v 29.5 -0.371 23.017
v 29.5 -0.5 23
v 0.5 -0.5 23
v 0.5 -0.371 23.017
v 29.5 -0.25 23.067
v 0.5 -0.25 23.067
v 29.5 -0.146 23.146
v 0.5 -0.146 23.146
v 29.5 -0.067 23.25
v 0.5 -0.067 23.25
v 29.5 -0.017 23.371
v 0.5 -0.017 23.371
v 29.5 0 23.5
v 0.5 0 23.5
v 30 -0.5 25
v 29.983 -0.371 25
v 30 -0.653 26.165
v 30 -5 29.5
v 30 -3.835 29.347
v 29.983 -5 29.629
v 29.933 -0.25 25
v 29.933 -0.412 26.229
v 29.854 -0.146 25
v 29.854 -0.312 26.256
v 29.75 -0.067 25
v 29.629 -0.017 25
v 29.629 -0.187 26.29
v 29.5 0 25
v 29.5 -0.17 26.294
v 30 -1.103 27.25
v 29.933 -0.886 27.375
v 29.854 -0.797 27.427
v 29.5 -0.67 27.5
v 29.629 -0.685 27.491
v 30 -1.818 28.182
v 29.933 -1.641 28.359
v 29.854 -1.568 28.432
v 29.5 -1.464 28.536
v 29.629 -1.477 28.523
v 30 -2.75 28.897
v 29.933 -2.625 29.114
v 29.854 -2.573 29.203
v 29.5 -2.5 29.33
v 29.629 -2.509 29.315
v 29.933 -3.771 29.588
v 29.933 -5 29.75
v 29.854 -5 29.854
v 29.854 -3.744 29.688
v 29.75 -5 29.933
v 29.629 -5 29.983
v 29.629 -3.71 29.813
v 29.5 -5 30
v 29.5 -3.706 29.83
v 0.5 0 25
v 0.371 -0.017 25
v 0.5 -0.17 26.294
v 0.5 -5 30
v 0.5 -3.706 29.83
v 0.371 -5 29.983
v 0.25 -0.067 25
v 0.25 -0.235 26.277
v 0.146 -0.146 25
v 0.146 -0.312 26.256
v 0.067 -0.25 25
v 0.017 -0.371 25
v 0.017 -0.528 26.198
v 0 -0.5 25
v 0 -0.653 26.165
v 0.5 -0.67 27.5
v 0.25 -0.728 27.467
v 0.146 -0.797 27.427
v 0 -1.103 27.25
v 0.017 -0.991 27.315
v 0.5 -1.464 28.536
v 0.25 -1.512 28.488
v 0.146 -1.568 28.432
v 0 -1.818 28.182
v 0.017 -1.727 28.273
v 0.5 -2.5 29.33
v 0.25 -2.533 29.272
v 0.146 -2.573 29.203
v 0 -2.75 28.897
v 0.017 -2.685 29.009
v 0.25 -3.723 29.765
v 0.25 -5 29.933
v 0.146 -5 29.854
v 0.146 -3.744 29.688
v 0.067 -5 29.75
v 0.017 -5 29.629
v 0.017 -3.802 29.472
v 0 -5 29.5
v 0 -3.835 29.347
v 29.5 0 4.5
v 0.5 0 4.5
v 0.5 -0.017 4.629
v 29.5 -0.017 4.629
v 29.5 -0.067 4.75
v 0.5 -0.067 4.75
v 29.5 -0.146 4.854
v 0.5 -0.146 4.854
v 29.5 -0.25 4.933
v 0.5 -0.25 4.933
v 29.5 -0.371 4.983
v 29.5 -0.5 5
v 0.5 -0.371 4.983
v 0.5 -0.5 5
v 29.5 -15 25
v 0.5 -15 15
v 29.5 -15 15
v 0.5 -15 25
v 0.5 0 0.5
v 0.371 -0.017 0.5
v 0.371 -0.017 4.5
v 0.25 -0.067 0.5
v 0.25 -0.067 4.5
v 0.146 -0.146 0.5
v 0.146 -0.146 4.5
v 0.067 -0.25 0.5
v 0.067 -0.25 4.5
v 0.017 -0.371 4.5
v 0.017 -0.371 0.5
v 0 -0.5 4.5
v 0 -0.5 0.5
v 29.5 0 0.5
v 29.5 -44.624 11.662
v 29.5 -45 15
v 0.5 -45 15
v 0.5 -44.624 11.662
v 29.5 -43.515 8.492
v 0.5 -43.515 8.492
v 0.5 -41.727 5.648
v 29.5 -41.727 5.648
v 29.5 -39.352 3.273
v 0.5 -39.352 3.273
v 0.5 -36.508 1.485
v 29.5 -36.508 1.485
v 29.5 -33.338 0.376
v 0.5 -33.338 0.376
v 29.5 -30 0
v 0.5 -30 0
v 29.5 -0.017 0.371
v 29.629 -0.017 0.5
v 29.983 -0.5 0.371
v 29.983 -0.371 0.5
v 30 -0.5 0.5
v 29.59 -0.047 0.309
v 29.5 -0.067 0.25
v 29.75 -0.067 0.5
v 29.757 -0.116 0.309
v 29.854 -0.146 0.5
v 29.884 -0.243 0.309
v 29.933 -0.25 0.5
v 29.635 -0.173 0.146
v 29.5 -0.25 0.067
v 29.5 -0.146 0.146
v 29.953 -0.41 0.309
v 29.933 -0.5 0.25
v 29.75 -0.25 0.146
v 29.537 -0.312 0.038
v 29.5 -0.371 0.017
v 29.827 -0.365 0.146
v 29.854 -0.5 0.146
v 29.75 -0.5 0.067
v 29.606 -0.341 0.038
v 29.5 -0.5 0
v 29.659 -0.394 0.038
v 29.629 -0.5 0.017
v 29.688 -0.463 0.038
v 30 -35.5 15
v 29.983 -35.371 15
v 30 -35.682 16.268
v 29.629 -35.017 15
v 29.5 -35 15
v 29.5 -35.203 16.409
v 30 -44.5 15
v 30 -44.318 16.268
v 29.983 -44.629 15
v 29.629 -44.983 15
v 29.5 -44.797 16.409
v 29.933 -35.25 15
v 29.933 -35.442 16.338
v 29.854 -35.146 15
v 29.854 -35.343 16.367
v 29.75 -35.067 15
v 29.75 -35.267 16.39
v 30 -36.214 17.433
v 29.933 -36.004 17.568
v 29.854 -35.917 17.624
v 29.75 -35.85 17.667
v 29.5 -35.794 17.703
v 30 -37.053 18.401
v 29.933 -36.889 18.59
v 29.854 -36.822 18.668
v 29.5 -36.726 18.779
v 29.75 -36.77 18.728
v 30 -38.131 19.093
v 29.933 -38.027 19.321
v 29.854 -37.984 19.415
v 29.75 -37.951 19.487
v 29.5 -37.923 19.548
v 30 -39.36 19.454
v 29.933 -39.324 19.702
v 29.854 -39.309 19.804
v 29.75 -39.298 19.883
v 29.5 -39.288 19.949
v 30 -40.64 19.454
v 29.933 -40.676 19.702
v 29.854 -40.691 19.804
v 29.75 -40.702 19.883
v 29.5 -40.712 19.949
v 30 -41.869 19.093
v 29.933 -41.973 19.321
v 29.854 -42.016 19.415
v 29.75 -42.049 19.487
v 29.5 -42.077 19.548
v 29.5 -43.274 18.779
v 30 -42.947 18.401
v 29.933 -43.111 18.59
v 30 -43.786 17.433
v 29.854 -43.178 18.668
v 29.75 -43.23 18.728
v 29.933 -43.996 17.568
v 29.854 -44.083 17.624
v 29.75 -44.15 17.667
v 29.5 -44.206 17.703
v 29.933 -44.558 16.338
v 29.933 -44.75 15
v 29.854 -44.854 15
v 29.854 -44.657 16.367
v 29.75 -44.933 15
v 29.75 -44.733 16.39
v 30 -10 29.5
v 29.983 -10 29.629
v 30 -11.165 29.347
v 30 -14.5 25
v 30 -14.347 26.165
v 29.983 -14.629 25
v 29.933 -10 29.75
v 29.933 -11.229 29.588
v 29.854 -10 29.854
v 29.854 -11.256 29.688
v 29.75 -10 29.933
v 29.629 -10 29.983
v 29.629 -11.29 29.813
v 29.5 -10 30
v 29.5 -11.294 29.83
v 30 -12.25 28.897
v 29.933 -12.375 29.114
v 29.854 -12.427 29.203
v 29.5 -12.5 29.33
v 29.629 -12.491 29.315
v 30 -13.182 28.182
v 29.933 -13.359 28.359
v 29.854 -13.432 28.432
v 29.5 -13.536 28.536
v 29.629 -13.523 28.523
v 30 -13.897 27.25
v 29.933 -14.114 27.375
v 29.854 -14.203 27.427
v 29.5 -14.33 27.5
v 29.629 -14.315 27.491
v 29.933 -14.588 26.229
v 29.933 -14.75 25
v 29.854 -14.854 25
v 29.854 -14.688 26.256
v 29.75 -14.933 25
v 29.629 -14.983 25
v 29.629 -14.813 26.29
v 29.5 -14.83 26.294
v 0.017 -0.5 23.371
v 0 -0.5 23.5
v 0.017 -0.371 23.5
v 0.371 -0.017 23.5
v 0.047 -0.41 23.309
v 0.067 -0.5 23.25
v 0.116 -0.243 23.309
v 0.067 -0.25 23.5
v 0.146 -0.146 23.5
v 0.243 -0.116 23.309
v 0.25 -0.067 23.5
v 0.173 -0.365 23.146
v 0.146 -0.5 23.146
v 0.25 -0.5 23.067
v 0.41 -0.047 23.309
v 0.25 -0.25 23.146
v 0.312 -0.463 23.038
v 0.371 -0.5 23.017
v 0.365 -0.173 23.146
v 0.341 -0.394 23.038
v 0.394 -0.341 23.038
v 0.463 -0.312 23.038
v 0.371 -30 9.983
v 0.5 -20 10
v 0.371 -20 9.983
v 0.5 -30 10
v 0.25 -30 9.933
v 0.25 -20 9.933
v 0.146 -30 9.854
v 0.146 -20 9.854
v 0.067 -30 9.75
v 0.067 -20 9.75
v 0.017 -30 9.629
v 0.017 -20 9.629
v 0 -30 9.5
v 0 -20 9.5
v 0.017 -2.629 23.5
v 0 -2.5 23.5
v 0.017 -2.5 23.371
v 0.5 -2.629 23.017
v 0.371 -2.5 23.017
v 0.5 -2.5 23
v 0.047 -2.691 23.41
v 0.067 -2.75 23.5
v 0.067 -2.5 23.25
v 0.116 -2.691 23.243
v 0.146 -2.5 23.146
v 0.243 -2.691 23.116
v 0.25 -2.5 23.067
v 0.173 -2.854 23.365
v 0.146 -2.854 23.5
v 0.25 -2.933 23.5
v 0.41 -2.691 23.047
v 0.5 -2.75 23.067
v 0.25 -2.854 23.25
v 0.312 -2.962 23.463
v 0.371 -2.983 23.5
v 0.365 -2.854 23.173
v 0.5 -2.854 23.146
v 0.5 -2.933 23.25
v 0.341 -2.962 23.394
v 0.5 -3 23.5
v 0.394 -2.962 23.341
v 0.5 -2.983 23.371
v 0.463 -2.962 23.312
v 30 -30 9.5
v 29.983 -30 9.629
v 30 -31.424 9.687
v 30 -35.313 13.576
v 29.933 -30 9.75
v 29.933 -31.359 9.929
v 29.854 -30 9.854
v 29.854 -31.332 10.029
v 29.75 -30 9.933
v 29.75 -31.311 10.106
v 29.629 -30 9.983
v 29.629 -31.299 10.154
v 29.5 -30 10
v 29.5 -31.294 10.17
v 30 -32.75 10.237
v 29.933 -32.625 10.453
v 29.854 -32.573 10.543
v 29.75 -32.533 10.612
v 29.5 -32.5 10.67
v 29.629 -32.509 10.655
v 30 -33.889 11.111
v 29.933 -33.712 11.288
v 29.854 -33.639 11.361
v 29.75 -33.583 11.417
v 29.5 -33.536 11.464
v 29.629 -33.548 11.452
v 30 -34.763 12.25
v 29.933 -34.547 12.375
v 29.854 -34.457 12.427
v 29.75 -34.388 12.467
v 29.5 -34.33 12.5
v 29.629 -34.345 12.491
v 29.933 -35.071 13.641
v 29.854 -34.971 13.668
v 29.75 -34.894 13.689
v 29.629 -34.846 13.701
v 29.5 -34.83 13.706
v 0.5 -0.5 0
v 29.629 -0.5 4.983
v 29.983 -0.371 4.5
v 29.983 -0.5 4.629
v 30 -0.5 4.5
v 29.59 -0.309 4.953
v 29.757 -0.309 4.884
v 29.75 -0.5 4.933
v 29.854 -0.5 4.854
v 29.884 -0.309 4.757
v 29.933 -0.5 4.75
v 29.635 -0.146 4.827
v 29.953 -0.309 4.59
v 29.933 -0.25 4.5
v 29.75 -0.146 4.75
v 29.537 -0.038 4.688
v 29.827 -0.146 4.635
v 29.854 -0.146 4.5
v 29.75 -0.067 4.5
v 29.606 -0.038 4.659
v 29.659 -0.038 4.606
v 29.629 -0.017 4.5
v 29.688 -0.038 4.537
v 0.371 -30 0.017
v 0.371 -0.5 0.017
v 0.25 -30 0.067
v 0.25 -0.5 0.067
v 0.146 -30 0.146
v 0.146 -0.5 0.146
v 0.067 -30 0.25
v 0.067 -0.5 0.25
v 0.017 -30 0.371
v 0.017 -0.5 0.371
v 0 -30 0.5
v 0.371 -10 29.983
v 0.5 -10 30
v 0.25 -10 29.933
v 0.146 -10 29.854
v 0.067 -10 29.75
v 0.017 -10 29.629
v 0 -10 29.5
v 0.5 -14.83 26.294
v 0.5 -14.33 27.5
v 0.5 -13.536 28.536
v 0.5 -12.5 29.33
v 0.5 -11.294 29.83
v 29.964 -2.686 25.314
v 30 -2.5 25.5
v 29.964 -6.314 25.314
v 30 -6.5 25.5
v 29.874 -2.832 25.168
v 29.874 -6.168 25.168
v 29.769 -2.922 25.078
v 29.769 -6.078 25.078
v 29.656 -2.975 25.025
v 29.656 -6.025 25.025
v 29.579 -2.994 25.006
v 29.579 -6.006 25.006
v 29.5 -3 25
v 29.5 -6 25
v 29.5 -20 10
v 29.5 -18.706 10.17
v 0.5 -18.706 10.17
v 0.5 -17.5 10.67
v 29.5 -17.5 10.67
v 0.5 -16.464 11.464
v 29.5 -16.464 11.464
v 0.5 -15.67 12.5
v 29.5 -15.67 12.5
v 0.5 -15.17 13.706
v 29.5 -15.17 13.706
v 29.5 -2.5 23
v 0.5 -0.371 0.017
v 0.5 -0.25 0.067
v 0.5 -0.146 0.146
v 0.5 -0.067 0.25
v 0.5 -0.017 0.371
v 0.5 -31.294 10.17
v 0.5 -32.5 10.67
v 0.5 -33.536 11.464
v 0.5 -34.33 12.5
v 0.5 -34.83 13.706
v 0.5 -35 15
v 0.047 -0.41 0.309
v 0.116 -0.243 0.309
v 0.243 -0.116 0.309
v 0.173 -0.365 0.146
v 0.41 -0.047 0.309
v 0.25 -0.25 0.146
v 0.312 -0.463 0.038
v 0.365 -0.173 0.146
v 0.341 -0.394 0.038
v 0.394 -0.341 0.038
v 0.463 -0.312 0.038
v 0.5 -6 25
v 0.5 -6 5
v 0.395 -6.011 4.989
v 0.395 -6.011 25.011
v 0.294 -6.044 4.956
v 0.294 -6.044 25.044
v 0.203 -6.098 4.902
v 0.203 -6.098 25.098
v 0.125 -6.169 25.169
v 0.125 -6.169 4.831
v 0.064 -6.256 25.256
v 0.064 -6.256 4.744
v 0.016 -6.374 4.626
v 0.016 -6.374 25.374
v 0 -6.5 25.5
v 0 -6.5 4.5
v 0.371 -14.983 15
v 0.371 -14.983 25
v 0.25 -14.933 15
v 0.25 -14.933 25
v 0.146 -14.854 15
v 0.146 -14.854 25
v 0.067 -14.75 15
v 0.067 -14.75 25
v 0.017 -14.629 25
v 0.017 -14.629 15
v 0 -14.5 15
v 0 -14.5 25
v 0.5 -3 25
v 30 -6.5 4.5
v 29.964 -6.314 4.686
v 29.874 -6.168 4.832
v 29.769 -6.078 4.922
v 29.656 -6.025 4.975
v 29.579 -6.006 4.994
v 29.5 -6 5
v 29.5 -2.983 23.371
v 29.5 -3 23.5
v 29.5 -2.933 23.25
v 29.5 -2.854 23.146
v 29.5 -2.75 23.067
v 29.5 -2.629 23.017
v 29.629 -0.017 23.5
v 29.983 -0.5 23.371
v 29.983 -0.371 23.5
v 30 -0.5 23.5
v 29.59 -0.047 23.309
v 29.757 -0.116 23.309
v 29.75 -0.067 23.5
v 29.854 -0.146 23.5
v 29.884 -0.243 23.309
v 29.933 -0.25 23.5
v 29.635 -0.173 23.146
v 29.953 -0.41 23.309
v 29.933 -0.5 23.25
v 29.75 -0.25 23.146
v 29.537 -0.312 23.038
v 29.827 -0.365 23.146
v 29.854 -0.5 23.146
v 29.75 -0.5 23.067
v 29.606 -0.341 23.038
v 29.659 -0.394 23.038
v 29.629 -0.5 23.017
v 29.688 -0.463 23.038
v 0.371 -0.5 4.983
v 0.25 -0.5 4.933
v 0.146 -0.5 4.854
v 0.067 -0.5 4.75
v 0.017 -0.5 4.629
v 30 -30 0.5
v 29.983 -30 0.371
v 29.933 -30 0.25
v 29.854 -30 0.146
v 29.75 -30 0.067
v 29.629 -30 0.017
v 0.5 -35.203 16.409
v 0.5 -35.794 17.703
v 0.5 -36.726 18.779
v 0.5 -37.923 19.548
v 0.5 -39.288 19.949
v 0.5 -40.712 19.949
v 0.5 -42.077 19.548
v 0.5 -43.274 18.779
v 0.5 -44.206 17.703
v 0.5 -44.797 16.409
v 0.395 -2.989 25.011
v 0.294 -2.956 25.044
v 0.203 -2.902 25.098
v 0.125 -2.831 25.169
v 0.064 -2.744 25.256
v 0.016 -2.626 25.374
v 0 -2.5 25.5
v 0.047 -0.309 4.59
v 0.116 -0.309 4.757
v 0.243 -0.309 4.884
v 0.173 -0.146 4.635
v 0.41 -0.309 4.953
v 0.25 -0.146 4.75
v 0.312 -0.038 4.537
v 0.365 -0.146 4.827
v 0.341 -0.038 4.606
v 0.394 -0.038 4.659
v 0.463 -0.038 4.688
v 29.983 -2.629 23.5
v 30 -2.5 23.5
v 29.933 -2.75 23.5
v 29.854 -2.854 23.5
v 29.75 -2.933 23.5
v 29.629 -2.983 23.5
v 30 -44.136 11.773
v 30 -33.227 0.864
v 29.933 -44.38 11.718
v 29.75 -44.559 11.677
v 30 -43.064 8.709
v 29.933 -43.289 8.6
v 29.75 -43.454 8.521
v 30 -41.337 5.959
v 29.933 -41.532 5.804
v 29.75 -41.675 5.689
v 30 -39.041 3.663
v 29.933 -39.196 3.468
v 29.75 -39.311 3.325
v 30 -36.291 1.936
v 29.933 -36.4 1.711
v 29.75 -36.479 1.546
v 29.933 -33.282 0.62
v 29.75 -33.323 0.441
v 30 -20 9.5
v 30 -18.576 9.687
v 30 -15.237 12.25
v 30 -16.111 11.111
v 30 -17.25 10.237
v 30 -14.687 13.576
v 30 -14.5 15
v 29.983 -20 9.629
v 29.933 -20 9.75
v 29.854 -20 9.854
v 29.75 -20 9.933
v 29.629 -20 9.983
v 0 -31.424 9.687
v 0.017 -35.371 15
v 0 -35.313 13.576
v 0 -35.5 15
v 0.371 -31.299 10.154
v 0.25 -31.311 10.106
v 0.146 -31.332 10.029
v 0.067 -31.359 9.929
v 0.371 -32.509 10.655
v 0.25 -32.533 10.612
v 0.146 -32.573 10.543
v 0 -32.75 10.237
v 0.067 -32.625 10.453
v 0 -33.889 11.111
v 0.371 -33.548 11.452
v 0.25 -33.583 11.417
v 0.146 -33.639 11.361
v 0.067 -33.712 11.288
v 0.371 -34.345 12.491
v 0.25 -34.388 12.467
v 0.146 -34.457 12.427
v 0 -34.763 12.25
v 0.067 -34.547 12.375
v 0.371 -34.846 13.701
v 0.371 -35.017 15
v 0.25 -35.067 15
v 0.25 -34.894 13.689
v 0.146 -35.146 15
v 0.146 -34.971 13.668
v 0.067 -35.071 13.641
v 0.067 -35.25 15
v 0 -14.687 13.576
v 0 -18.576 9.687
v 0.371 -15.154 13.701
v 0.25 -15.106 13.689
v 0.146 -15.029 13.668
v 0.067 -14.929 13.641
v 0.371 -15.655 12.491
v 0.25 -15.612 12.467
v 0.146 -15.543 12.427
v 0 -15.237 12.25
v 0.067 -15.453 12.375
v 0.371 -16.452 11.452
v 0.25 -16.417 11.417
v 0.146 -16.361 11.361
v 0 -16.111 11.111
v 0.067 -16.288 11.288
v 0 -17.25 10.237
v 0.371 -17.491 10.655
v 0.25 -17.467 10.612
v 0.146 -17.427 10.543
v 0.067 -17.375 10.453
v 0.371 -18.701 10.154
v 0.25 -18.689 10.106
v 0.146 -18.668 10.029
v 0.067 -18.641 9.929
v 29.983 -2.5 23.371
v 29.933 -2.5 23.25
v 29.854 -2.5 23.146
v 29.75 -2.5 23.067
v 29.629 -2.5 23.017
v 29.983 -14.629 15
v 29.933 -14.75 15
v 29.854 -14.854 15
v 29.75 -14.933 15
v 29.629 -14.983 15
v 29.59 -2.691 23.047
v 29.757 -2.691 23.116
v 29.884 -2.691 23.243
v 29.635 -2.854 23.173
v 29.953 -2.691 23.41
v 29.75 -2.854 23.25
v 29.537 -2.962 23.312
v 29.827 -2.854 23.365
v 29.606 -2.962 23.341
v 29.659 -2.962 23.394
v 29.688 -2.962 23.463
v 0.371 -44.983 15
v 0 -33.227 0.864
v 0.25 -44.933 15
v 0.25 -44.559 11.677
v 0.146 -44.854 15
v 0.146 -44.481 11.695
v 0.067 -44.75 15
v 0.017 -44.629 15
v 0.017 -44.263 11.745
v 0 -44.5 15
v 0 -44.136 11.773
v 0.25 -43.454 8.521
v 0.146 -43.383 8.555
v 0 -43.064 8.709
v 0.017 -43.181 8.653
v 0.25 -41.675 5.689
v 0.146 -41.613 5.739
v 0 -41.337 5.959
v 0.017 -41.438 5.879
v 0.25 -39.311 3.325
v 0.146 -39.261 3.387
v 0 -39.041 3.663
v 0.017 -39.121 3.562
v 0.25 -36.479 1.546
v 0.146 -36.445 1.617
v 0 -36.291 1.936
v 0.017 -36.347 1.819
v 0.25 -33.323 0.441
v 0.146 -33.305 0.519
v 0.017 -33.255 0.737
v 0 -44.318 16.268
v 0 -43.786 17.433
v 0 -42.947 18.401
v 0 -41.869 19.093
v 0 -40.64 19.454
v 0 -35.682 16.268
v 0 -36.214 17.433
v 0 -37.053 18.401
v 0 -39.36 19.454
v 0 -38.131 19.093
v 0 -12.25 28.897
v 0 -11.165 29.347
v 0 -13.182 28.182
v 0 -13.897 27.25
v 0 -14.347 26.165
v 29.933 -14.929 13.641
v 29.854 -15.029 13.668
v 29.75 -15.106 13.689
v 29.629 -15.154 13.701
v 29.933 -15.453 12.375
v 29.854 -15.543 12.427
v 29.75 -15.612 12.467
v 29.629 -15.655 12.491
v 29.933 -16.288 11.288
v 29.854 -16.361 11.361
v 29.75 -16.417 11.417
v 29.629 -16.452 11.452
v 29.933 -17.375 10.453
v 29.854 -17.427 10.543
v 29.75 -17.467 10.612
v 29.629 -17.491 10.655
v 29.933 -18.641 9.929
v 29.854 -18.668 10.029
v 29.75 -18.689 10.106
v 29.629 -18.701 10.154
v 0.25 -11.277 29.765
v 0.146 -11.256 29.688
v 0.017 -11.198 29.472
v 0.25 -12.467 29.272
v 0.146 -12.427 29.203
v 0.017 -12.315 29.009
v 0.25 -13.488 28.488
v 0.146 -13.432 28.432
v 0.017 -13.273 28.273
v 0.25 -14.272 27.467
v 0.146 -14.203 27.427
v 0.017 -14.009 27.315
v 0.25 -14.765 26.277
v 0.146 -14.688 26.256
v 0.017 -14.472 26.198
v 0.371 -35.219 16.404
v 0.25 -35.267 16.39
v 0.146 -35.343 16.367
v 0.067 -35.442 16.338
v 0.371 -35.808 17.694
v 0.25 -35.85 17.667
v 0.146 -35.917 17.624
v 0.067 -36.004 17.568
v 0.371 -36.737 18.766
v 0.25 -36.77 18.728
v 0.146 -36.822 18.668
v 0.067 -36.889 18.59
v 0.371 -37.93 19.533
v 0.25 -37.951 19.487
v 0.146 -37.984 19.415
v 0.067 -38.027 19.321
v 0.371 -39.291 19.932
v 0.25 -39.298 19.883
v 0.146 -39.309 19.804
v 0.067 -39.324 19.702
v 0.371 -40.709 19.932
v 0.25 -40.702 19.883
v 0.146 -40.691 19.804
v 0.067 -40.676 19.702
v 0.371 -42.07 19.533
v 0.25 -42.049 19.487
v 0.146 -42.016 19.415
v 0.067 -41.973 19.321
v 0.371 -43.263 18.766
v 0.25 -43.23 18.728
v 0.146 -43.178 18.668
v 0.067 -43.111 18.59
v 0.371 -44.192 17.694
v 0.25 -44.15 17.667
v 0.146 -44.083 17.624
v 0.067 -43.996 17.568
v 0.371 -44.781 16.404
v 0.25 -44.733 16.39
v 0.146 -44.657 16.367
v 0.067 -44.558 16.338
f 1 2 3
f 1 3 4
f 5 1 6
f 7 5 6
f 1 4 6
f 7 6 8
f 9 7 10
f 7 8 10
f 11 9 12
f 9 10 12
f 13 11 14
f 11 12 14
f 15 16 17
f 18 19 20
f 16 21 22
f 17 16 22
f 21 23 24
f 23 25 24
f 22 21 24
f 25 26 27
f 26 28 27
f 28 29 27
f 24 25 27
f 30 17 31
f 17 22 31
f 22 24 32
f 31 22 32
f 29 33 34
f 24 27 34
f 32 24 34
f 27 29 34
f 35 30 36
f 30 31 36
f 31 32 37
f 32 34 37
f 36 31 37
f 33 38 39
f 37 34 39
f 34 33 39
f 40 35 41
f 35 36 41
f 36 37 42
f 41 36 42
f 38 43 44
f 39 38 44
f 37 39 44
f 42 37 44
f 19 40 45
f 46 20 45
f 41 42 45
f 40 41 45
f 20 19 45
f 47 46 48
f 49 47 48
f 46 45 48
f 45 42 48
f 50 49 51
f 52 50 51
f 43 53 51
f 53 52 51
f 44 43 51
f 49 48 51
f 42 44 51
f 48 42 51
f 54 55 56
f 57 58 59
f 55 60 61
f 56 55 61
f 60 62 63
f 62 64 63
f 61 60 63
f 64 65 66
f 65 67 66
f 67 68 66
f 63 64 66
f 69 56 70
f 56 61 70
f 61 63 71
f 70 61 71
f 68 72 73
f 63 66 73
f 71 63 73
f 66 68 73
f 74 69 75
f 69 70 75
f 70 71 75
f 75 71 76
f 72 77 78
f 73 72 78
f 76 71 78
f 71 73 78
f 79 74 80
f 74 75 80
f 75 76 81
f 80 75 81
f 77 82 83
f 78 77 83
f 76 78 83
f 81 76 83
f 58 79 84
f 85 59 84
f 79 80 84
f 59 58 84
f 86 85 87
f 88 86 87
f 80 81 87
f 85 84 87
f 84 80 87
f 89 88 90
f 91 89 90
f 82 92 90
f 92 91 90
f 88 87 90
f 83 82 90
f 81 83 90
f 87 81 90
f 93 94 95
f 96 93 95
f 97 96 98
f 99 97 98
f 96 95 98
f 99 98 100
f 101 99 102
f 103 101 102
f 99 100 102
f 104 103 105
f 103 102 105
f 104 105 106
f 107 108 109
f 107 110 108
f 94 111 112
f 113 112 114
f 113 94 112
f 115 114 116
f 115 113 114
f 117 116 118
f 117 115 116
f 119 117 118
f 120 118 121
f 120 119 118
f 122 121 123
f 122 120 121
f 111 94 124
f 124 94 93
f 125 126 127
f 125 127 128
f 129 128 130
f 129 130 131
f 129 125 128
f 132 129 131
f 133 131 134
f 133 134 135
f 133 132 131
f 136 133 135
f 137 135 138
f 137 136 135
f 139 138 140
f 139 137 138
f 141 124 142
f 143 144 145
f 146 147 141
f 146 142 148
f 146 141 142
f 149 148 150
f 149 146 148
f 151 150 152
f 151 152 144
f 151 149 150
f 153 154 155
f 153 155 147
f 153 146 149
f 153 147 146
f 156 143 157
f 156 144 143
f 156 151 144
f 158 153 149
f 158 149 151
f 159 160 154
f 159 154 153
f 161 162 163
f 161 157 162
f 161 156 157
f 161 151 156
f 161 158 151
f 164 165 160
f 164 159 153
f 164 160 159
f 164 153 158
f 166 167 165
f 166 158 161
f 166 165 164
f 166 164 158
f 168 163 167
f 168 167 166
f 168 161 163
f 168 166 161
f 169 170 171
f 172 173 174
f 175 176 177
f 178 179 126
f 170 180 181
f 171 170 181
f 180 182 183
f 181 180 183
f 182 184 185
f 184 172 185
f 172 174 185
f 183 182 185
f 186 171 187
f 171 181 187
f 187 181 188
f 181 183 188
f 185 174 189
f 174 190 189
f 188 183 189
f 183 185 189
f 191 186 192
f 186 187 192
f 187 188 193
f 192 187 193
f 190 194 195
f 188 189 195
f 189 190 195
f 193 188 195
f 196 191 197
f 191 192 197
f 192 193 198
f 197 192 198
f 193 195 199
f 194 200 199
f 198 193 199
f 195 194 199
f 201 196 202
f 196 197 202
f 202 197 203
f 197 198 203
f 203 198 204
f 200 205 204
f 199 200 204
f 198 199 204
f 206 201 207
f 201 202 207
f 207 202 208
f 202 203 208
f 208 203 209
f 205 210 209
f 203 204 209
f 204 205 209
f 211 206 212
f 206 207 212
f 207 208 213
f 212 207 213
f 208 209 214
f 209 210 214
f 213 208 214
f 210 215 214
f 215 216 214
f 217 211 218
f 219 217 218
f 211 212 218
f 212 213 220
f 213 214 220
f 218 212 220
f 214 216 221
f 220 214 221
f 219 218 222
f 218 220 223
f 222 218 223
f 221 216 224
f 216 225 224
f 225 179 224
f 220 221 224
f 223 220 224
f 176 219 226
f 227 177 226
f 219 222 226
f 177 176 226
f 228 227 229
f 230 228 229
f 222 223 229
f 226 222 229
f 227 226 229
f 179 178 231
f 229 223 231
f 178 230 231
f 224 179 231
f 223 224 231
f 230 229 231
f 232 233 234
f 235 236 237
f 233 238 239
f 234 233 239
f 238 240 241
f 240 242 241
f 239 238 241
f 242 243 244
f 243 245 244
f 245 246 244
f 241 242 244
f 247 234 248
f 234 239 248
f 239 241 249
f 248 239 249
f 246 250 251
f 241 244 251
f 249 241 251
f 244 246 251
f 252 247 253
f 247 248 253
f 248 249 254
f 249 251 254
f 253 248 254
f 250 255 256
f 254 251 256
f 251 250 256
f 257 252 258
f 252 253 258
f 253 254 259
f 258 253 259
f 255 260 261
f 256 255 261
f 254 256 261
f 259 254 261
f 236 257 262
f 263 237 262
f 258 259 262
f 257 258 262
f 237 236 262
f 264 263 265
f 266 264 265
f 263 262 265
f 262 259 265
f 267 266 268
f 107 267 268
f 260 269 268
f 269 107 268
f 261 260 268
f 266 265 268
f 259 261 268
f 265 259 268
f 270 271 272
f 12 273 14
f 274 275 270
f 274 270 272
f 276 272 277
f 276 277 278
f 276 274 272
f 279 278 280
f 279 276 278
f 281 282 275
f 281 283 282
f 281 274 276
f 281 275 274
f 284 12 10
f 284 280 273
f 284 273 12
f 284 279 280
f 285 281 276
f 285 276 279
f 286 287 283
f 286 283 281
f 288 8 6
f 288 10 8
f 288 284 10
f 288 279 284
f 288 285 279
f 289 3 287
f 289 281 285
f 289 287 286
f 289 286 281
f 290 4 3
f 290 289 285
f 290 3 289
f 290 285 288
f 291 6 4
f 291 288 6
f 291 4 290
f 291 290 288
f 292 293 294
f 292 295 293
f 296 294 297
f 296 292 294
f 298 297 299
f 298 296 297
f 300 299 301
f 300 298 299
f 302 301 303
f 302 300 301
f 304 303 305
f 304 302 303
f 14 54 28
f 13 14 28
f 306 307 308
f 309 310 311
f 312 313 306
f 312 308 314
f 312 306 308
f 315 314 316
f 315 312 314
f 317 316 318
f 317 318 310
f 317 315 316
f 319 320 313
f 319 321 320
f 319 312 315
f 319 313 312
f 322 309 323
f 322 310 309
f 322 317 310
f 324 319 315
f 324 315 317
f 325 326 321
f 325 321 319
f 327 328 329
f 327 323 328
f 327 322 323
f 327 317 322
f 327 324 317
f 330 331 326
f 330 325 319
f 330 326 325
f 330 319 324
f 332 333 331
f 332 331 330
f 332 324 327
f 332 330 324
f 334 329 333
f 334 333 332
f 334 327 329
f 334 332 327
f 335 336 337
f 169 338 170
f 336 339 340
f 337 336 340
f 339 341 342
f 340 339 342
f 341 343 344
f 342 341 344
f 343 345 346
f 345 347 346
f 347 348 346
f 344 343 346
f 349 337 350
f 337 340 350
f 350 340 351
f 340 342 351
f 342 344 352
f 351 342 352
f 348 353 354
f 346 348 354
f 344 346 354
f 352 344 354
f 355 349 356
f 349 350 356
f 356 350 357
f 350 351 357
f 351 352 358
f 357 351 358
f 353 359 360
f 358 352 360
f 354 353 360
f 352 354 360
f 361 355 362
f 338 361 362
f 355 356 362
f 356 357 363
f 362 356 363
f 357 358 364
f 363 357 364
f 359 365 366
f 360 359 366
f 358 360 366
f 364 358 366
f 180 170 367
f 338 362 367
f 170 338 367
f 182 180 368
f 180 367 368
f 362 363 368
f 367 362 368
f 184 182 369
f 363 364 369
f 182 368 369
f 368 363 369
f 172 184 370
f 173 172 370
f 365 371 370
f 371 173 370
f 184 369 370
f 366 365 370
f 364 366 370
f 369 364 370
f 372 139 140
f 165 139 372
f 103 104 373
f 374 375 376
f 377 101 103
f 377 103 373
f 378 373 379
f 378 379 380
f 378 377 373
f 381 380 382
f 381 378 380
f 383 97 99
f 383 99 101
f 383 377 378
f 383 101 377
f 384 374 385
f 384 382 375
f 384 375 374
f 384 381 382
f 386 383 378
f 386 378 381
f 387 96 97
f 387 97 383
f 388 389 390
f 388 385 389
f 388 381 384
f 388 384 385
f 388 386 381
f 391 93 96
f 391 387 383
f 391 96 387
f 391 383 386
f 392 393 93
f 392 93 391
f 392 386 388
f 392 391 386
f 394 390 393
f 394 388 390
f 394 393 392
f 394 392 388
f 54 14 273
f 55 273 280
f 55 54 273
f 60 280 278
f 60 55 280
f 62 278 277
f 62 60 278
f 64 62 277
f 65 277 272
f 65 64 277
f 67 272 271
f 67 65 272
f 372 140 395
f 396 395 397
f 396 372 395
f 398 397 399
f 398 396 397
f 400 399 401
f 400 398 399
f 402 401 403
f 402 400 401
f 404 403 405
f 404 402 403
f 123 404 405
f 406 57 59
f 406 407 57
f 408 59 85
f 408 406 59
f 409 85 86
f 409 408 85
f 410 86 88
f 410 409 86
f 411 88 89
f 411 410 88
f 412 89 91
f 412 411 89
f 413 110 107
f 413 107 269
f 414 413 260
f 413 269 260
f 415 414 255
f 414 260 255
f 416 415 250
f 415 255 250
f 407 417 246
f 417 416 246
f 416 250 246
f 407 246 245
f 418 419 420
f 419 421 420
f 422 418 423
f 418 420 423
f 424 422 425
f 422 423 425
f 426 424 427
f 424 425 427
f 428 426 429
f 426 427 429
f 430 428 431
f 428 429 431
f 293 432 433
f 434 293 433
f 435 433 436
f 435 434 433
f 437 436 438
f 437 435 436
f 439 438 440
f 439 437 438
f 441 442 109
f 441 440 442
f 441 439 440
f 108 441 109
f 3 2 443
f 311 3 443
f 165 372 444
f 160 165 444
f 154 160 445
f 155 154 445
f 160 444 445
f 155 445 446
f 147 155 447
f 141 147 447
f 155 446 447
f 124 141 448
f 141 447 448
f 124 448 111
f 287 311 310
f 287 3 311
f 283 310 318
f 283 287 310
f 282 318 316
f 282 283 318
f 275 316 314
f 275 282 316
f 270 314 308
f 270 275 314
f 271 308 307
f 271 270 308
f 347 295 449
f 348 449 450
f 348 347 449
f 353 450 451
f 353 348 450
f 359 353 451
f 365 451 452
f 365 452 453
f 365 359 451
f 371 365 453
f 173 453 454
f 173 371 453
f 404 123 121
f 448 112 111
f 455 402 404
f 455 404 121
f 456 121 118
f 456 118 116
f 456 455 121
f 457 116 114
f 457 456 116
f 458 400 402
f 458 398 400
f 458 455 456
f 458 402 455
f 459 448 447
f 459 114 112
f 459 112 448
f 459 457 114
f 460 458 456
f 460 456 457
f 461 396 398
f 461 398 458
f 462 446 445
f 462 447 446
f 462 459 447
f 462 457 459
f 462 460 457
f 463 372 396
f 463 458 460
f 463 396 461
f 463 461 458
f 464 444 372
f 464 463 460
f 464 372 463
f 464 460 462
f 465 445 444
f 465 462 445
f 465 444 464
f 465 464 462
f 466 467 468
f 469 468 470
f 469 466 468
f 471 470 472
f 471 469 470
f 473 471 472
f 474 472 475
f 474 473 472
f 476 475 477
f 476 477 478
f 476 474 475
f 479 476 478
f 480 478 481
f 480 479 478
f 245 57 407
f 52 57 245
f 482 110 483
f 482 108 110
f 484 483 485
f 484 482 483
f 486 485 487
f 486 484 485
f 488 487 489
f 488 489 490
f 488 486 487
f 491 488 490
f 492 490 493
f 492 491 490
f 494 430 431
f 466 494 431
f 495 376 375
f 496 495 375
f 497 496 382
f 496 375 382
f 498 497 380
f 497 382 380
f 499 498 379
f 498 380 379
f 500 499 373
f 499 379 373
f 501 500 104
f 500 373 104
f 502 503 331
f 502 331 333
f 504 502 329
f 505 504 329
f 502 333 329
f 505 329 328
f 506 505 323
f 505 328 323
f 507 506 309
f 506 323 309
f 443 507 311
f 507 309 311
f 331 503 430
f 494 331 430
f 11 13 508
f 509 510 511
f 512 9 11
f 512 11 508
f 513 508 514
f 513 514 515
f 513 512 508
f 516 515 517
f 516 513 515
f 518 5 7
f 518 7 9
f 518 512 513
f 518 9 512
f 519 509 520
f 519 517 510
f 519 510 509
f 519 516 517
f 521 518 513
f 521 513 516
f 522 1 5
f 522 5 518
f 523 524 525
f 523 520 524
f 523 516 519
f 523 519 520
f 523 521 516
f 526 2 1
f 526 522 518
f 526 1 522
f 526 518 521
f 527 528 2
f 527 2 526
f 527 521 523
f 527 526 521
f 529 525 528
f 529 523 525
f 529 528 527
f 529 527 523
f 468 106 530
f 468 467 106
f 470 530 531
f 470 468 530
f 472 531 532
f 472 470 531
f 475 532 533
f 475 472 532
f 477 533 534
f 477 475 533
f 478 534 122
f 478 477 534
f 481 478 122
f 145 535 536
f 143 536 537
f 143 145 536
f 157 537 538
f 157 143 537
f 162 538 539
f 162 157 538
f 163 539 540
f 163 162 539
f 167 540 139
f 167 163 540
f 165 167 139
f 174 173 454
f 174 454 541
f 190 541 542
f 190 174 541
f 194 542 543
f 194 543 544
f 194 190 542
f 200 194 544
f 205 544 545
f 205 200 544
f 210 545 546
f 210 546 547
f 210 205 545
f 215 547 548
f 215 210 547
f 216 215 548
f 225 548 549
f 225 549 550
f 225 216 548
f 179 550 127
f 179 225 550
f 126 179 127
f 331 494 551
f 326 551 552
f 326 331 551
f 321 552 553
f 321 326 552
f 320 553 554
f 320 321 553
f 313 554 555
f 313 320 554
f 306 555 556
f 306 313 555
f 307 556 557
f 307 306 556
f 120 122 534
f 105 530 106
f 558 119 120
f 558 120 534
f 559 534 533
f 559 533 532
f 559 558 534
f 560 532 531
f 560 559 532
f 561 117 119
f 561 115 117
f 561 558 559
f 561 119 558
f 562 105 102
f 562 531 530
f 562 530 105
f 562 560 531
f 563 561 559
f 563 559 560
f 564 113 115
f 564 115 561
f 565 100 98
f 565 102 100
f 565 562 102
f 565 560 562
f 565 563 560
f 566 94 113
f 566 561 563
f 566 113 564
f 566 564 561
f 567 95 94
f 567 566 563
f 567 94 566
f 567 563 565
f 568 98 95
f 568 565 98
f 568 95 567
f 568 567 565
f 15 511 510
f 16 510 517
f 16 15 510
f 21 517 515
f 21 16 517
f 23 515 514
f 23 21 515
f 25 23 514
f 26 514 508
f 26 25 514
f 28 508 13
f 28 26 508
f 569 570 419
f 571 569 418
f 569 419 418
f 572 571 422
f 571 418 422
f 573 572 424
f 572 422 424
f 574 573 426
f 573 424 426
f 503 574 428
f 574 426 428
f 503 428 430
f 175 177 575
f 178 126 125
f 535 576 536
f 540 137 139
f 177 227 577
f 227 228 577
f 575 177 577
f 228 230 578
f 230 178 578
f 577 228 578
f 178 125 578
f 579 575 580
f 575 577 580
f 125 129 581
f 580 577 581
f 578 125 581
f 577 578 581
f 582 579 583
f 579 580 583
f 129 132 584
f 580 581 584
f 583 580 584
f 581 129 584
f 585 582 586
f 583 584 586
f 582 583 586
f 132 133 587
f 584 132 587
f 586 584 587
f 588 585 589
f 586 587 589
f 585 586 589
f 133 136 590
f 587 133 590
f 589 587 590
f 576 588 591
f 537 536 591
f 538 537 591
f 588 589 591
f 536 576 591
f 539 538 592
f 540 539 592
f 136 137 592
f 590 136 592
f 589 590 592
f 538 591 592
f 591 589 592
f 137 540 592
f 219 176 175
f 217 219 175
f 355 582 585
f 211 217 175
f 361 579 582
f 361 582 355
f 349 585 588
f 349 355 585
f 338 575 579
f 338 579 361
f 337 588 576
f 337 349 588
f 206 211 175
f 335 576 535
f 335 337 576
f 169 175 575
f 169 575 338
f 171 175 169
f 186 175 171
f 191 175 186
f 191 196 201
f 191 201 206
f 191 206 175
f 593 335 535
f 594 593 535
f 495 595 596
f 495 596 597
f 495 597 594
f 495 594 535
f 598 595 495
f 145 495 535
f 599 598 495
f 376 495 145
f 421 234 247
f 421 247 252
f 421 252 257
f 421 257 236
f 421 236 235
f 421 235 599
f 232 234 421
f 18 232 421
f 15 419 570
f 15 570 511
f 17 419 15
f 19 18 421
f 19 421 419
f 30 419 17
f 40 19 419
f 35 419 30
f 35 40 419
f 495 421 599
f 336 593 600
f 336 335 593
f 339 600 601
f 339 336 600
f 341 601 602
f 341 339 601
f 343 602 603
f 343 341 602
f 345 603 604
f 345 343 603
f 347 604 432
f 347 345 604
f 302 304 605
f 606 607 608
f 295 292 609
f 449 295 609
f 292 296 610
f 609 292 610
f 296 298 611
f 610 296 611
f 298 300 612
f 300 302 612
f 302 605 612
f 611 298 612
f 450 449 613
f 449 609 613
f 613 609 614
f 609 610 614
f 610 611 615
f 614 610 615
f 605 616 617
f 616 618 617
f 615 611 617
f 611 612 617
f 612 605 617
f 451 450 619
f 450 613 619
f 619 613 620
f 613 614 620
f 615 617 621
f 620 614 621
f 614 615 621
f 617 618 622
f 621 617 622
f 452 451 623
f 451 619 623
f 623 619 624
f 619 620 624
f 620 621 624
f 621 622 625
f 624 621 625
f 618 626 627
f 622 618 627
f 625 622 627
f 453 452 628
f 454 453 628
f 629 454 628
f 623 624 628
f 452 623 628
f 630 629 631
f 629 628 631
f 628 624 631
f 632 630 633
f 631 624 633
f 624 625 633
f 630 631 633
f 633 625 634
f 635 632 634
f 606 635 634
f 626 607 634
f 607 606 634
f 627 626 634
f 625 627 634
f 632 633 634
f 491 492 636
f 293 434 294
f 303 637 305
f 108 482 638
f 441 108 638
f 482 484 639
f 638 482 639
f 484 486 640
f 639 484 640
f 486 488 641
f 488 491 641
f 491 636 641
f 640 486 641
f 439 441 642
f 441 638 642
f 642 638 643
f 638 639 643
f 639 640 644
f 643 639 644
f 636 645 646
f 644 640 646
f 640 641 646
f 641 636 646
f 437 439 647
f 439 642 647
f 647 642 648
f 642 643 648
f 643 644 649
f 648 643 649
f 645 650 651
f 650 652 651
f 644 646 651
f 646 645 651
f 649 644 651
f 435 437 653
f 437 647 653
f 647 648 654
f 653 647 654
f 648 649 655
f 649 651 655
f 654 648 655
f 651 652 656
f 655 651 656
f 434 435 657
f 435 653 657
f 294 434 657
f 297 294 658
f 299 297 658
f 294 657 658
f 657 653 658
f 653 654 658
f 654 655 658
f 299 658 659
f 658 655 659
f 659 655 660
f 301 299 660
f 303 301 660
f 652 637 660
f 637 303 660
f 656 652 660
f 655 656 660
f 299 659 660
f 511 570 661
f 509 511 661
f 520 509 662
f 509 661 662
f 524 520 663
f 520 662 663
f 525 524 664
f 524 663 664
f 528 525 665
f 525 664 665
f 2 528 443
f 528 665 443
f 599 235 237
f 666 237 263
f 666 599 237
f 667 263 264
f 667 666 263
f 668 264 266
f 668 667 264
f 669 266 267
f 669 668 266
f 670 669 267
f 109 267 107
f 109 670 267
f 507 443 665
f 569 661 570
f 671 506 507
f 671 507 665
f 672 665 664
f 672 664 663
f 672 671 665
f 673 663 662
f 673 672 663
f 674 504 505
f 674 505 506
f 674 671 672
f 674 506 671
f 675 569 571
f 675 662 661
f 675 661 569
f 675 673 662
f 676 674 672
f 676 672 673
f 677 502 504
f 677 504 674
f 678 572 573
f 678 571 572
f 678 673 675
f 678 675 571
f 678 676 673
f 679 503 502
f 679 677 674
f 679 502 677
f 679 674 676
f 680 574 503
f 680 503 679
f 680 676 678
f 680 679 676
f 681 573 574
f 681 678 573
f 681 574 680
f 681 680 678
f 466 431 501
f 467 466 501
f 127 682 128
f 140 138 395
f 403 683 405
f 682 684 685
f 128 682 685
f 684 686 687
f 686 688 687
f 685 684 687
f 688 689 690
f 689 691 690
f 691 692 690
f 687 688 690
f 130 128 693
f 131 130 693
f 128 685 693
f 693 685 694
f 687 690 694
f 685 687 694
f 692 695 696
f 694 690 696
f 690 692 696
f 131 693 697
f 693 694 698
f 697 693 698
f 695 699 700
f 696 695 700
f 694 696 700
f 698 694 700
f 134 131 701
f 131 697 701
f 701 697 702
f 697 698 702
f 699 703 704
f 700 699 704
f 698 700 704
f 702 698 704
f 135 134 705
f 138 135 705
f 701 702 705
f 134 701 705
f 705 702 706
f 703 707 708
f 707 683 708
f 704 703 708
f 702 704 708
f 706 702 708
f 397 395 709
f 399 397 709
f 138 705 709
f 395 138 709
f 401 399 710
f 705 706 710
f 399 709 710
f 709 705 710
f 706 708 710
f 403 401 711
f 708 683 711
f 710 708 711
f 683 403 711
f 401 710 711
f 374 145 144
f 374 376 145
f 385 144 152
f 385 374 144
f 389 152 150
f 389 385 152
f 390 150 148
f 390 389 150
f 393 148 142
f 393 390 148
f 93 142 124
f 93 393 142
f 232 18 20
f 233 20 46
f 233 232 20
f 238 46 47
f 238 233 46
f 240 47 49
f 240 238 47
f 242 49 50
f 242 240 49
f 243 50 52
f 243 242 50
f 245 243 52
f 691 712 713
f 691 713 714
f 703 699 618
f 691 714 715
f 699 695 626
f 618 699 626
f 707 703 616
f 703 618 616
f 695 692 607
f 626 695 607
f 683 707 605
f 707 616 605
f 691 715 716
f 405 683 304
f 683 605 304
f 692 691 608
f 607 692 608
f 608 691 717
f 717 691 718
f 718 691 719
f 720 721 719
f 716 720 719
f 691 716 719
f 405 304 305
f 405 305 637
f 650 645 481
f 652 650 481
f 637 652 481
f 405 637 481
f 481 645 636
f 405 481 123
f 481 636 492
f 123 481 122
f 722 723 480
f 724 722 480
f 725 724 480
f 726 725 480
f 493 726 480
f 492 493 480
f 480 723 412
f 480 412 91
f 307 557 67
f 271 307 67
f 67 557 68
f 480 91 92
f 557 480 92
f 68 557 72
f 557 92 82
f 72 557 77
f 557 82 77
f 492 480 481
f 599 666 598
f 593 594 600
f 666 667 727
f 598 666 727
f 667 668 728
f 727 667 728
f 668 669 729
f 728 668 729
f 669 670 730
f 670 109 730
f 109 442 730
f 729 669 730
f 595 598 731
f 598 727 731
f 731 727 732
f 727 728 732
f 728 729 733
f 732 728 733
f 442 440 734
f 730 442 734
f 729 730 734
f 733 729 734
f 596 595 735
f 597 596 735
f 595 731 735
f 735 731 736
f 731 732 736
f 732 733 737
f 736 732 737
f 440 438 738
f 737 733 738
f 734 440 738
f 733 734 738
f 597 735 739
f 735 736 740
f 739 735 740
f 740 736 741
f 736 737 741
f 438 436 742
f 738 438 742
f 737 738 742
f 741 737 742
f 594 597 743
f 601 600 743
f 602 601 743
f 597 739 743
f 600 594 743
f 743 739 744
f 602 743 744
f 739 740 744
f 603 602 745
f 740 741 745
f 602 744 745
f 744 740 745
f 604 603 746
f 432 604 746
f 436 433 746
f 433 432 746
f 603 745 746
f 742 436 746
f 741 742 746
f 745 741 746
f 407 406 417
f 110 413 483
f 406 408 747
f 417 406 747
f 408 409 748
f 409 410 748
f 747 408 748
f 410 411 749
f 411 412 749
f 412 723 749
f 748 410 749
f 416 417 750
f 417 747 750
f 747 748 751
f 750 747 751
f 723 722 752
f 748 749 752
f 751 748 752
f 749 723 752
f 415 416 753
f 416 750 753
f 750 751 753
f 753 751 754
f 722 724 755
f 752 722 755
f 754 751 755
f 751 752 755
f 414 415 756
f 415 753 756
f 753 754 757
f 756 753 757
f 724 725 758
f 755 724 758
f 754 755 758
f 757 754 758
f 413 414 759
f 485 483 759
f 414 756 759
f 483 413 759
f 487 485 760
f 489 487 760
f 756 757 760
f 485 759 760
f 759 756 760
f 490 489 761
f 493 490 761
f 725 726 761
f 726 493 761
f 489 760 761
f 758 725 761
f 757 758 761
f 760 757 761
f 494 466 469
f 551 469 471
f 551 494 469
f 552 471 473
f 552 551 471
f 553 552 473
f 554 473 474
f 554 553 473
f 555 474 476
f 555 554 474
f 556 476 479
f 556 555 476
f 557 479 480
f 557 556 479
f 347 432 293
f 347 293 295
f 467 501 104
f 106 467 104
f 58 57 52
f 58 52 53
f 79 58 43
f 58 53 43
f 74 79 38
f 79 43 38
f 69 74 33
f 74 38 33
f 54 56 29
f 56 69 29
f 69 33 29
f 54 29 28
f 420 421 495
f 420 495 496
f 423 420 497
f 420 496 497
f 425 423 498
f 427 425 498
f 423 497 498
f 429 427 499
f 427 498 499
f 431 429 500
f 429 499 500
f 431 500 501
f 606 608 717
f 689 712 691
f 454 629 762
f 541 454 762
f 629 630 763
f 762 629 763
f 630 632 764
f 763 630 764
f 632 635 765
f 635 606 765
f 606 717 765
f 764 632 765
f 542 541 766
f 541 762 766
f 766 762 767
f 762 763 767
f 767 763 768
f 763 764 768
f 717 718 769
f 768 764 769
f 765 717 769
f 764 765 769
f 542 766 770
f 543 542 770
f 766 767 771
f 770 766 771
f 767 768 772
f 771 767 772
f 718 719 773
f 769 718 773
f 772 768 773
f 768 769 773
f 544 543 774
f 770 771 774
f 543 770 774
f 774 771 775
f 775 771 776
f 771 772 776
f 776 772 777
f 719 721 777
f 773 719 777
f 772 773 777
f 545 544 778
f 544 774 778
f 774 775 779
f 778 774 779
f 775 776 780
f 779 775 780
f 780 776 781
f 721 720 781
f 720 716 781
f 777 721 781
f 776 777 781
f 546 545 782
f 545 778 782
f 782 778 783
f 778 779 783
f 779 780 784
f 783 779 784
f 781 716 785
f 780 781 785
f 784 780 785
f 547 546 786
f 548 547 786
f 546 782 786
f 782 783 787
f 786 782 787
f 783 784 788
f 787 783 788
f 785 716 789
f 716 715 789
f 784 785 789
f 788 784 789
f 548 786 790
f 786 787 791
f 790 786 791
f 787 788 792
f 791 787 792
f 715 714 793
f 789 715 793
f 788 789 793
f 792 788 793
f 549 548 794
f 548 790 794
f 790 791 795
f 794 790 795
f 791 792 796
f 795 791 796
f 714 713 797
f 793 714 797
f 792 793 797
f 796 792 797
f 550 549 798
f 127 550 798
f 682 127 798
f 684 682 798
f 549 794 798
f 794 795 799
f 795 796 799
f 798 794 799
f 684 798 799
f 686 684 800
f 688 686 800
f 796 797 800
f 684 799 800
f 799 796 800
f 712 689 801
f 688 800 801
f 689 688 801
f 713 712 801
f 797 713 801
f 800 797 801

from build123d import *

# Parameters (mm, degrees)
F0_W         = 30
F0_H         = 30
F1_DEPTH     = 15
F3_DEPTH     = 30.001
F5_DEPTH     = 30
F6_R         = 5
F7_R         = 0.5
F8_T1_DEPTH  = 29
F8_S5_W      = 0.5
F8_S5_H      = 0.5
F8_T6_DEPTH  = 0.5
F8_S11_W     = 0.5
F8_S11_H     = 0.5
F8_T12_DEPTH = 0.5
F8_S17_W     = 0.5
F8_S17_H     = 0.5
F8_T18_DEPTH = 0.5
F8_S23_W     = 0.5
F8_S23_H     = 0.5
F8_T24_DEPTH = 0.5
F8_S29_W     = 0.5
F8_S29_H     = 0.5
F8_T30_DEPTH = 0.5
F8_S35_W     = 0.5
F8_S35_H     = 0.5
F8_T36_DEPTH = 0.5
F8_S41_W     = 0.5
F8_S41_H     = 0.5
F8_T42_DEPTH = 0.5
F8_S47_W     = 0.5
F8_S47_H     = 0.5
F8_T48_DEPTH = 0.5


# Not quite as in the source:
# - a fillet or chamfer that OpenCascade refuses, or shapes differently, is made with other operations: its cross-section is extruded or revolved along the edge and cut away or added


with BuildPart() as f1:
    # F0 (on Front) → F1 (new body)
    with BuildSketch(Plane.XZ):
        with Locations((15, 15)):
            Rectangle(F0_W, F0_H)
    extrude(amount=F1_DEPTH)

    # F2 (on face) → F3 (cut, through all)
    with BuildSketch(Plane.YZ.offset(30)):
        Polygon((-6, 5), (0, 5), (0, 23), (-3, 23), (-3, 25), (-6, 25), align=None)
    extrude(amount=-F3_DEPTH, mode=Mode.SUBTRACT)

    # F4 (on face) → F5 (join, through all)
    with BuildSketch(Plane.YZ.offset(30)):
        with BuildLine():
            Line((-30, 0), (-15, 0))
            Line((-15, 0), (-15, 10))
            Line((-15, 10), (-30, 10))
            ThreePointArc((-30, 10), (-33.5355339059, 11.4644660941), (-35, 15))
            ThreePointArc((-35, 15), (-40, 20), (-45, 15))
            ThreePointArc((-45, 15), (-40.6066017178, 4.3933982822), (-30, 0))
        make_face()
    extrude(amount=-F5_DEPTH)

    # F6
    f6_edges = [f1.edges().sort_by_distance(p)[0] for p in [
        (15, -15, 10),
        (15, -15, 30),
        (15, 0, 30),
    ]]
    fillet(f6_edges, radius=F6_R)

    # F7
    f7_edges = [f1.edges().sort_by_distance(p)[0] for p in [
        (30, -25, 10),
        (30, -16.464466, 11.464466),
        (30, -33.535534, 11.464466),
        (30, -15, 20),
        (30, -40, 20),
        (30, -13.535534, 28.535534),
        (30, -40.606602, 4.393398),
        (30, -7.5, 30),
        (30, -15, 0),
        (30, -1.464466, 28.535534),
        (30, 0, 2.5),
        (30, 0, 24),
        (30, -3, 5),
        (30, -1.5, 23),
        (30, -6, 15),
        (30, -3, 24),
        (30, -4.5, 25),
        (0, 0, 24),
        (0, -1.464466, 28.535534),
        (0, -1.5, 23),
        (0, -7.5, 30),
        (0, -3, 24),
        (0, -13.535534, 28.535534),
        (0, -4.5, 25),
        (0, -15, 20),
        (0, -6, 15),
        (0, -16.464466, 11.464466),
        (0, -3, 5),
        (0, -25, 10),
        (0, 0, 2.5),
        (0, -33.535534, 11.464466),
        (0, -15, 0),
        (0, -40, 20),
        (0, -40.606602, 4.393398),
    ]]
    fillet(f7_edges, radius=F7_R)

    # F8: fillet of radius 0.5 on 4 edges, made by hand

    # F8_s2 → F8_t1 (cut)
    with BuildSketch(Plane.YZ.offset(0.5)):
        with BuildLine():
            ThreePointArc((0, 4.5), (-0.1464466094, 4.8535533906), (-0.5, 5))
            Line((-0.5, 5), (0, 5))
            Line((0, 5), (0, 4.5))
        make_face()
        with BuildLine():
            ThreePointArc((-0.5, 0), (-0.1464466094, 0.1464466094), (0, 0.5))
            Line((0, 0.5), (0, 0))
            Line((0, 0), (-0.5, 0))
        make_face()
        with BuildLine():
            ThreePointArc((-0.5, 23), (-0.1464466094, 23.1464466094), (0, 23.5))
            Line((0, 23.5), (0, 23))
            Line((0, 23), (-0.5, 23))
        make_face()
        with BuildLine():
            ThreePointArc((-3, 23.5), (-2.8535533906, 23.1464466094), (-2.5, 23))
            Line((-2.5, 23), (-3, 23))
            Line((-3, 23), (-3, 23.5))
        make_face()
    extrude(amount=F8_T1_DEPTH, mode=Mode.SUBTRACT)


with BuildPart() as f8_tool4:
    # F8_s5 → F8_t6 (new body)
    with BuildSketch(Plane.XZ.offset(2.5)):
        with Locations((29.75, 23.25)):
            Rectangle(F8_S5_W, F8_S5_H)
    extrude(amount=F8_T6_DEPTH)

    # F8_s7 → F8_t8 (revolve, cut)
    with BuildSketch(Plane(origin=(29.5, -2.5, 23.5), x_dir=(-0.7071067812, 0, 0.7071067812), z_dir=(0.7071067812, 0, 0.7071067812))):
        with BuildLine():
            ThreePointArc((0, -0.5), (0.5, 0), (0, 0.5))
            Line((0, 0.5), (0, -0.5))
        make_face()
    revolve(axis=Axis((29.5, -2.5, 23.5), (0, -1, 0)), mode=Mode.SUBTRACT)


with BuildPart() as f1_1:
    add(f1.part)

    # F8_t3: cut F8_tool4
    add(f8_tool4.part, mode=Mode.SUBTRACT)


with BuildPart() as f8_tool10:
    # F8_s11 → F8_t12 (new body)
    with BuildSketch(Plane.XZ.offset(2.5)):
        with Locations((0.25, 23.25)):
            Rectangle(F8_S11_W, F8_S11_H)
    extrude(amount=F8_T12_DEPTH)

    # F8_s13 → F8_t14 (revolve, cut)
    with BuildSketch(Plane(origin=(0.5, -2.5, 23.5), x_dir=(0.7071067812, 0, 0.7071067812), z_dir=(0.7071067812, 0, -0.7071067812))):
        with BuildLine():
            ThreePointArc((0, -0.5), (0.5, 0), (0, 0.5))
            Line((0, 0.5), (0, -0.5))
        make_face()
    revolve(axis=Axis((0.5, -2.5, 23.5), (0, -1, 0)), mode=Mode.SUBTRACT)


with BuildPart() as f1_2:
    add(f1_1.part)

    # F8_t9: cut F8_tool10
    add(f8_tool10.part, mode=Mode.SUBTRACT)


with BuildPart() as f8_tool16:
    # F8_s17 → F8_t18 (new body)
    with BuildSketch(Plane.XY.offset(23.5)):
        with Locations((29.75, -0.25)):
            Rectangle(F8_S17_W, F8_S17_H)
    extrude(amount=-F8_T18_DEPTH)

    # F8_s19 → F8_t20 (revolve, cut)
    with BuildSketch(Plane(origin=(29.5, -0.5, 23.5), x_dir=(-0.7071067812, -0.7071067812, 0), z_dir=(0.7071067812, -0.7071067812, 0))):
        with BuildLine():
            ThreePointArc((0, -0.5), (0.5, 0), (0, 0.5))
            Line((0, 0.5), (0, -0.5))
        make_face()
    revolve(axis=Axis((29.5, -0.5, 23.5), (0, 0, -1)), mode=Mode.SUBTRACT)


with BuildPart() as f1_3:
    add(f1_2.part)

    # F8_t15: cut F8_tool16
    add(f8_tool16.part, mode=Mode.SUBTRACT)


with BuildPart() as f8_tool22:
    # F8_s23 → F8_t24 (new body)
    with BuildSketch(Plane.XY.offset(23.5)):
        with Locations((0.25, -0.25)):
            Rectangle(F8_S23_W, F8_S23_H)
    extrude(amount=-F8_T24_DEPTH)

    # F8_s25 → F8_t26 (revolve, cut)
    with BuildSketch(Plane(origin=(0.5, -0.5, 23.5), x_dir=(0.7071067812, -0.7071067812, 0), z_dir=(0.7071067812, 0.7071067812, 0))):
        with BuildLine():
            ThreePointArc((0, -0.5), (0.5, 0), (0, 0.5))
            Line((0, 0.5), (0, -0.5))
        make_face()
    revolve(axis=Axis((0.5, -0.5, 23.5), (0, 0, -1)), mode=Mode.SUBTRACT)


with BuildPart() as f1_4:
    add(f1_3.part)

    # F8_t21: cut F8_tool22
    add(f8_tool22.part, mode=Mode.SUBTRACT)


with BuildPart() as f8_tool28:
    # F8_s29 → F8_t30 (new body)
    with BuildSketch(Plane.XY.offset(0.5)):
        with Locations((0.25, -0.25)):
            Rectangle(F8_S29_W, F8_S29_H)
    extrude(amount=-F8_T30_DEPTH)

    # F8_s31 → F8_t32 (revolve, cut)
    with BuildSketch(Plane(origin=(0.5, -0.5, 0.5), x_dir=(0.7071067812, -0.7071067812, 0), z_dir=(0.7071067812, 0.7071067812, 0))):
        with BuildLine():
            ThreePointArc((0, -0.5), (0.5, 0), (0, 0.5))
            Line((0, 0.5), (0, -0.5))
        make_face()
    revolve(axis=Axis((0.5, -0.5, 0.5), (0, 0, -1)), mode=Mode.SUBTRACT)


with BuildPart() as f1_5:
    add(f1_4.part)

    # F8_t27: cut F8_tool28
    add(f8_tool28.part, mode=Mode.SUBTRACT)


with BuildPart() as f8_tool34:
    # F8_s35 → F8_t36 (new body)
    with BuildSketch(Plane.XY.offset(0.5)):
        with Locations((29.75, -0.25)):
            Rectangle(F8_S35_W, F8_S35_H)
    extrude(amount=-F8_T36_DEPTH)

    # F8_s37 → F8_t38 (revolve, cut)
    with BuildSketch(Plane(origin=(29.5, -0.5, 0.5), x_dir=(-0.7071067812, -0.7071067812, 0), z_dir=(0.7071067812, -0.7071067812, 0))):
        with BuildLine():
            ThreePointArc((0, -0.5), (0.5, 0), (0, 0.5))
            Line((0, 0.5), (0, -0.5))
        make_face()
    revolve(axis=Axis((29.5, -0.5, 0.5), (0, 0, -1)), mode=Mode.SUBTRACT)


with BuildPart() as f1_6:
    add(f1_5.part)

    # F8_t33: cut F8_tool34
    add(f8_tool34.part, mode=Mode.SUBTRACT)


with BuildPart() as f8_tool40:
    # F8_s41 → F8_t42 (new body)
    with BuildSketch(Plane.XZ.offset(0.5)):
        with Locations((29.75, 4.75)):
            Rectangle(F8_S41_W, F8_S41_H)
    extrude(amount=-F8_T42_DEPTH)

    # F8_s43 → F8_t44 (revolve, cut)
    with BuildSketch(Plane(origin=(29.5, -0.5, 4.5), x_dir=(-0.7071067812, 0, -0.7071067812), z_dir=(0.7071067812, 0, -0.7071067812))):
        with BuildLine():
            ThreePointArc((0, -0.5), (0.5, 0), (0, 0.5))
            Line((0, 0.5), (0, -0.5))
        make_face()
    revolve(axis=Axis((29.5, -0.5, 4.5), (0, 1, 0)), mode=Mode.SUBTRACT)


with BuildPart() as f1_7:
    add(f1_6.part)

    # F8_t39: cut F8_tool40
    add(f8_tool40.part, mode=Mode.SUBTRACT)


with BuildPart() as f8_tool46:
    # F8_s47 → F8_t48 (new body)
    with BuildSketch(Plane.XZ.offset(0.5)):
        with Locations((0.25, 4.75)):
            Rectangle(F8_S47_W, F8_S47_H)
    extrude(amount=-F8_T48_DEPTH)

    # F8_s49 → F8_t50 (revolve, cut)
    with BuildSketch(Plane(origin=(0.5, -0.5, 4.5), x_dir=(0.7071067812, 0, -0.7071067812), z_dir=(0.7071067812, 0, 0.7071067812))):
        with BuildLine():
            ThreePointArc((0, -0.5), (0.5, 0), (0, 0.5))
            Line((0, 0.5), (0, -0.5))
        make_face()
    revolve(axis=Axis((0.5, -0.5, 4.5), (0, 1, 0)), mode=Mode.SUBTRACT)


with BuildPart() as f1_8:
    add(f1_7.part)

    # F8_t45: cut F8_tool46
    add(f8_tool46.part, mode=Mode.SUBTRACT)


solid = f1_8.part
